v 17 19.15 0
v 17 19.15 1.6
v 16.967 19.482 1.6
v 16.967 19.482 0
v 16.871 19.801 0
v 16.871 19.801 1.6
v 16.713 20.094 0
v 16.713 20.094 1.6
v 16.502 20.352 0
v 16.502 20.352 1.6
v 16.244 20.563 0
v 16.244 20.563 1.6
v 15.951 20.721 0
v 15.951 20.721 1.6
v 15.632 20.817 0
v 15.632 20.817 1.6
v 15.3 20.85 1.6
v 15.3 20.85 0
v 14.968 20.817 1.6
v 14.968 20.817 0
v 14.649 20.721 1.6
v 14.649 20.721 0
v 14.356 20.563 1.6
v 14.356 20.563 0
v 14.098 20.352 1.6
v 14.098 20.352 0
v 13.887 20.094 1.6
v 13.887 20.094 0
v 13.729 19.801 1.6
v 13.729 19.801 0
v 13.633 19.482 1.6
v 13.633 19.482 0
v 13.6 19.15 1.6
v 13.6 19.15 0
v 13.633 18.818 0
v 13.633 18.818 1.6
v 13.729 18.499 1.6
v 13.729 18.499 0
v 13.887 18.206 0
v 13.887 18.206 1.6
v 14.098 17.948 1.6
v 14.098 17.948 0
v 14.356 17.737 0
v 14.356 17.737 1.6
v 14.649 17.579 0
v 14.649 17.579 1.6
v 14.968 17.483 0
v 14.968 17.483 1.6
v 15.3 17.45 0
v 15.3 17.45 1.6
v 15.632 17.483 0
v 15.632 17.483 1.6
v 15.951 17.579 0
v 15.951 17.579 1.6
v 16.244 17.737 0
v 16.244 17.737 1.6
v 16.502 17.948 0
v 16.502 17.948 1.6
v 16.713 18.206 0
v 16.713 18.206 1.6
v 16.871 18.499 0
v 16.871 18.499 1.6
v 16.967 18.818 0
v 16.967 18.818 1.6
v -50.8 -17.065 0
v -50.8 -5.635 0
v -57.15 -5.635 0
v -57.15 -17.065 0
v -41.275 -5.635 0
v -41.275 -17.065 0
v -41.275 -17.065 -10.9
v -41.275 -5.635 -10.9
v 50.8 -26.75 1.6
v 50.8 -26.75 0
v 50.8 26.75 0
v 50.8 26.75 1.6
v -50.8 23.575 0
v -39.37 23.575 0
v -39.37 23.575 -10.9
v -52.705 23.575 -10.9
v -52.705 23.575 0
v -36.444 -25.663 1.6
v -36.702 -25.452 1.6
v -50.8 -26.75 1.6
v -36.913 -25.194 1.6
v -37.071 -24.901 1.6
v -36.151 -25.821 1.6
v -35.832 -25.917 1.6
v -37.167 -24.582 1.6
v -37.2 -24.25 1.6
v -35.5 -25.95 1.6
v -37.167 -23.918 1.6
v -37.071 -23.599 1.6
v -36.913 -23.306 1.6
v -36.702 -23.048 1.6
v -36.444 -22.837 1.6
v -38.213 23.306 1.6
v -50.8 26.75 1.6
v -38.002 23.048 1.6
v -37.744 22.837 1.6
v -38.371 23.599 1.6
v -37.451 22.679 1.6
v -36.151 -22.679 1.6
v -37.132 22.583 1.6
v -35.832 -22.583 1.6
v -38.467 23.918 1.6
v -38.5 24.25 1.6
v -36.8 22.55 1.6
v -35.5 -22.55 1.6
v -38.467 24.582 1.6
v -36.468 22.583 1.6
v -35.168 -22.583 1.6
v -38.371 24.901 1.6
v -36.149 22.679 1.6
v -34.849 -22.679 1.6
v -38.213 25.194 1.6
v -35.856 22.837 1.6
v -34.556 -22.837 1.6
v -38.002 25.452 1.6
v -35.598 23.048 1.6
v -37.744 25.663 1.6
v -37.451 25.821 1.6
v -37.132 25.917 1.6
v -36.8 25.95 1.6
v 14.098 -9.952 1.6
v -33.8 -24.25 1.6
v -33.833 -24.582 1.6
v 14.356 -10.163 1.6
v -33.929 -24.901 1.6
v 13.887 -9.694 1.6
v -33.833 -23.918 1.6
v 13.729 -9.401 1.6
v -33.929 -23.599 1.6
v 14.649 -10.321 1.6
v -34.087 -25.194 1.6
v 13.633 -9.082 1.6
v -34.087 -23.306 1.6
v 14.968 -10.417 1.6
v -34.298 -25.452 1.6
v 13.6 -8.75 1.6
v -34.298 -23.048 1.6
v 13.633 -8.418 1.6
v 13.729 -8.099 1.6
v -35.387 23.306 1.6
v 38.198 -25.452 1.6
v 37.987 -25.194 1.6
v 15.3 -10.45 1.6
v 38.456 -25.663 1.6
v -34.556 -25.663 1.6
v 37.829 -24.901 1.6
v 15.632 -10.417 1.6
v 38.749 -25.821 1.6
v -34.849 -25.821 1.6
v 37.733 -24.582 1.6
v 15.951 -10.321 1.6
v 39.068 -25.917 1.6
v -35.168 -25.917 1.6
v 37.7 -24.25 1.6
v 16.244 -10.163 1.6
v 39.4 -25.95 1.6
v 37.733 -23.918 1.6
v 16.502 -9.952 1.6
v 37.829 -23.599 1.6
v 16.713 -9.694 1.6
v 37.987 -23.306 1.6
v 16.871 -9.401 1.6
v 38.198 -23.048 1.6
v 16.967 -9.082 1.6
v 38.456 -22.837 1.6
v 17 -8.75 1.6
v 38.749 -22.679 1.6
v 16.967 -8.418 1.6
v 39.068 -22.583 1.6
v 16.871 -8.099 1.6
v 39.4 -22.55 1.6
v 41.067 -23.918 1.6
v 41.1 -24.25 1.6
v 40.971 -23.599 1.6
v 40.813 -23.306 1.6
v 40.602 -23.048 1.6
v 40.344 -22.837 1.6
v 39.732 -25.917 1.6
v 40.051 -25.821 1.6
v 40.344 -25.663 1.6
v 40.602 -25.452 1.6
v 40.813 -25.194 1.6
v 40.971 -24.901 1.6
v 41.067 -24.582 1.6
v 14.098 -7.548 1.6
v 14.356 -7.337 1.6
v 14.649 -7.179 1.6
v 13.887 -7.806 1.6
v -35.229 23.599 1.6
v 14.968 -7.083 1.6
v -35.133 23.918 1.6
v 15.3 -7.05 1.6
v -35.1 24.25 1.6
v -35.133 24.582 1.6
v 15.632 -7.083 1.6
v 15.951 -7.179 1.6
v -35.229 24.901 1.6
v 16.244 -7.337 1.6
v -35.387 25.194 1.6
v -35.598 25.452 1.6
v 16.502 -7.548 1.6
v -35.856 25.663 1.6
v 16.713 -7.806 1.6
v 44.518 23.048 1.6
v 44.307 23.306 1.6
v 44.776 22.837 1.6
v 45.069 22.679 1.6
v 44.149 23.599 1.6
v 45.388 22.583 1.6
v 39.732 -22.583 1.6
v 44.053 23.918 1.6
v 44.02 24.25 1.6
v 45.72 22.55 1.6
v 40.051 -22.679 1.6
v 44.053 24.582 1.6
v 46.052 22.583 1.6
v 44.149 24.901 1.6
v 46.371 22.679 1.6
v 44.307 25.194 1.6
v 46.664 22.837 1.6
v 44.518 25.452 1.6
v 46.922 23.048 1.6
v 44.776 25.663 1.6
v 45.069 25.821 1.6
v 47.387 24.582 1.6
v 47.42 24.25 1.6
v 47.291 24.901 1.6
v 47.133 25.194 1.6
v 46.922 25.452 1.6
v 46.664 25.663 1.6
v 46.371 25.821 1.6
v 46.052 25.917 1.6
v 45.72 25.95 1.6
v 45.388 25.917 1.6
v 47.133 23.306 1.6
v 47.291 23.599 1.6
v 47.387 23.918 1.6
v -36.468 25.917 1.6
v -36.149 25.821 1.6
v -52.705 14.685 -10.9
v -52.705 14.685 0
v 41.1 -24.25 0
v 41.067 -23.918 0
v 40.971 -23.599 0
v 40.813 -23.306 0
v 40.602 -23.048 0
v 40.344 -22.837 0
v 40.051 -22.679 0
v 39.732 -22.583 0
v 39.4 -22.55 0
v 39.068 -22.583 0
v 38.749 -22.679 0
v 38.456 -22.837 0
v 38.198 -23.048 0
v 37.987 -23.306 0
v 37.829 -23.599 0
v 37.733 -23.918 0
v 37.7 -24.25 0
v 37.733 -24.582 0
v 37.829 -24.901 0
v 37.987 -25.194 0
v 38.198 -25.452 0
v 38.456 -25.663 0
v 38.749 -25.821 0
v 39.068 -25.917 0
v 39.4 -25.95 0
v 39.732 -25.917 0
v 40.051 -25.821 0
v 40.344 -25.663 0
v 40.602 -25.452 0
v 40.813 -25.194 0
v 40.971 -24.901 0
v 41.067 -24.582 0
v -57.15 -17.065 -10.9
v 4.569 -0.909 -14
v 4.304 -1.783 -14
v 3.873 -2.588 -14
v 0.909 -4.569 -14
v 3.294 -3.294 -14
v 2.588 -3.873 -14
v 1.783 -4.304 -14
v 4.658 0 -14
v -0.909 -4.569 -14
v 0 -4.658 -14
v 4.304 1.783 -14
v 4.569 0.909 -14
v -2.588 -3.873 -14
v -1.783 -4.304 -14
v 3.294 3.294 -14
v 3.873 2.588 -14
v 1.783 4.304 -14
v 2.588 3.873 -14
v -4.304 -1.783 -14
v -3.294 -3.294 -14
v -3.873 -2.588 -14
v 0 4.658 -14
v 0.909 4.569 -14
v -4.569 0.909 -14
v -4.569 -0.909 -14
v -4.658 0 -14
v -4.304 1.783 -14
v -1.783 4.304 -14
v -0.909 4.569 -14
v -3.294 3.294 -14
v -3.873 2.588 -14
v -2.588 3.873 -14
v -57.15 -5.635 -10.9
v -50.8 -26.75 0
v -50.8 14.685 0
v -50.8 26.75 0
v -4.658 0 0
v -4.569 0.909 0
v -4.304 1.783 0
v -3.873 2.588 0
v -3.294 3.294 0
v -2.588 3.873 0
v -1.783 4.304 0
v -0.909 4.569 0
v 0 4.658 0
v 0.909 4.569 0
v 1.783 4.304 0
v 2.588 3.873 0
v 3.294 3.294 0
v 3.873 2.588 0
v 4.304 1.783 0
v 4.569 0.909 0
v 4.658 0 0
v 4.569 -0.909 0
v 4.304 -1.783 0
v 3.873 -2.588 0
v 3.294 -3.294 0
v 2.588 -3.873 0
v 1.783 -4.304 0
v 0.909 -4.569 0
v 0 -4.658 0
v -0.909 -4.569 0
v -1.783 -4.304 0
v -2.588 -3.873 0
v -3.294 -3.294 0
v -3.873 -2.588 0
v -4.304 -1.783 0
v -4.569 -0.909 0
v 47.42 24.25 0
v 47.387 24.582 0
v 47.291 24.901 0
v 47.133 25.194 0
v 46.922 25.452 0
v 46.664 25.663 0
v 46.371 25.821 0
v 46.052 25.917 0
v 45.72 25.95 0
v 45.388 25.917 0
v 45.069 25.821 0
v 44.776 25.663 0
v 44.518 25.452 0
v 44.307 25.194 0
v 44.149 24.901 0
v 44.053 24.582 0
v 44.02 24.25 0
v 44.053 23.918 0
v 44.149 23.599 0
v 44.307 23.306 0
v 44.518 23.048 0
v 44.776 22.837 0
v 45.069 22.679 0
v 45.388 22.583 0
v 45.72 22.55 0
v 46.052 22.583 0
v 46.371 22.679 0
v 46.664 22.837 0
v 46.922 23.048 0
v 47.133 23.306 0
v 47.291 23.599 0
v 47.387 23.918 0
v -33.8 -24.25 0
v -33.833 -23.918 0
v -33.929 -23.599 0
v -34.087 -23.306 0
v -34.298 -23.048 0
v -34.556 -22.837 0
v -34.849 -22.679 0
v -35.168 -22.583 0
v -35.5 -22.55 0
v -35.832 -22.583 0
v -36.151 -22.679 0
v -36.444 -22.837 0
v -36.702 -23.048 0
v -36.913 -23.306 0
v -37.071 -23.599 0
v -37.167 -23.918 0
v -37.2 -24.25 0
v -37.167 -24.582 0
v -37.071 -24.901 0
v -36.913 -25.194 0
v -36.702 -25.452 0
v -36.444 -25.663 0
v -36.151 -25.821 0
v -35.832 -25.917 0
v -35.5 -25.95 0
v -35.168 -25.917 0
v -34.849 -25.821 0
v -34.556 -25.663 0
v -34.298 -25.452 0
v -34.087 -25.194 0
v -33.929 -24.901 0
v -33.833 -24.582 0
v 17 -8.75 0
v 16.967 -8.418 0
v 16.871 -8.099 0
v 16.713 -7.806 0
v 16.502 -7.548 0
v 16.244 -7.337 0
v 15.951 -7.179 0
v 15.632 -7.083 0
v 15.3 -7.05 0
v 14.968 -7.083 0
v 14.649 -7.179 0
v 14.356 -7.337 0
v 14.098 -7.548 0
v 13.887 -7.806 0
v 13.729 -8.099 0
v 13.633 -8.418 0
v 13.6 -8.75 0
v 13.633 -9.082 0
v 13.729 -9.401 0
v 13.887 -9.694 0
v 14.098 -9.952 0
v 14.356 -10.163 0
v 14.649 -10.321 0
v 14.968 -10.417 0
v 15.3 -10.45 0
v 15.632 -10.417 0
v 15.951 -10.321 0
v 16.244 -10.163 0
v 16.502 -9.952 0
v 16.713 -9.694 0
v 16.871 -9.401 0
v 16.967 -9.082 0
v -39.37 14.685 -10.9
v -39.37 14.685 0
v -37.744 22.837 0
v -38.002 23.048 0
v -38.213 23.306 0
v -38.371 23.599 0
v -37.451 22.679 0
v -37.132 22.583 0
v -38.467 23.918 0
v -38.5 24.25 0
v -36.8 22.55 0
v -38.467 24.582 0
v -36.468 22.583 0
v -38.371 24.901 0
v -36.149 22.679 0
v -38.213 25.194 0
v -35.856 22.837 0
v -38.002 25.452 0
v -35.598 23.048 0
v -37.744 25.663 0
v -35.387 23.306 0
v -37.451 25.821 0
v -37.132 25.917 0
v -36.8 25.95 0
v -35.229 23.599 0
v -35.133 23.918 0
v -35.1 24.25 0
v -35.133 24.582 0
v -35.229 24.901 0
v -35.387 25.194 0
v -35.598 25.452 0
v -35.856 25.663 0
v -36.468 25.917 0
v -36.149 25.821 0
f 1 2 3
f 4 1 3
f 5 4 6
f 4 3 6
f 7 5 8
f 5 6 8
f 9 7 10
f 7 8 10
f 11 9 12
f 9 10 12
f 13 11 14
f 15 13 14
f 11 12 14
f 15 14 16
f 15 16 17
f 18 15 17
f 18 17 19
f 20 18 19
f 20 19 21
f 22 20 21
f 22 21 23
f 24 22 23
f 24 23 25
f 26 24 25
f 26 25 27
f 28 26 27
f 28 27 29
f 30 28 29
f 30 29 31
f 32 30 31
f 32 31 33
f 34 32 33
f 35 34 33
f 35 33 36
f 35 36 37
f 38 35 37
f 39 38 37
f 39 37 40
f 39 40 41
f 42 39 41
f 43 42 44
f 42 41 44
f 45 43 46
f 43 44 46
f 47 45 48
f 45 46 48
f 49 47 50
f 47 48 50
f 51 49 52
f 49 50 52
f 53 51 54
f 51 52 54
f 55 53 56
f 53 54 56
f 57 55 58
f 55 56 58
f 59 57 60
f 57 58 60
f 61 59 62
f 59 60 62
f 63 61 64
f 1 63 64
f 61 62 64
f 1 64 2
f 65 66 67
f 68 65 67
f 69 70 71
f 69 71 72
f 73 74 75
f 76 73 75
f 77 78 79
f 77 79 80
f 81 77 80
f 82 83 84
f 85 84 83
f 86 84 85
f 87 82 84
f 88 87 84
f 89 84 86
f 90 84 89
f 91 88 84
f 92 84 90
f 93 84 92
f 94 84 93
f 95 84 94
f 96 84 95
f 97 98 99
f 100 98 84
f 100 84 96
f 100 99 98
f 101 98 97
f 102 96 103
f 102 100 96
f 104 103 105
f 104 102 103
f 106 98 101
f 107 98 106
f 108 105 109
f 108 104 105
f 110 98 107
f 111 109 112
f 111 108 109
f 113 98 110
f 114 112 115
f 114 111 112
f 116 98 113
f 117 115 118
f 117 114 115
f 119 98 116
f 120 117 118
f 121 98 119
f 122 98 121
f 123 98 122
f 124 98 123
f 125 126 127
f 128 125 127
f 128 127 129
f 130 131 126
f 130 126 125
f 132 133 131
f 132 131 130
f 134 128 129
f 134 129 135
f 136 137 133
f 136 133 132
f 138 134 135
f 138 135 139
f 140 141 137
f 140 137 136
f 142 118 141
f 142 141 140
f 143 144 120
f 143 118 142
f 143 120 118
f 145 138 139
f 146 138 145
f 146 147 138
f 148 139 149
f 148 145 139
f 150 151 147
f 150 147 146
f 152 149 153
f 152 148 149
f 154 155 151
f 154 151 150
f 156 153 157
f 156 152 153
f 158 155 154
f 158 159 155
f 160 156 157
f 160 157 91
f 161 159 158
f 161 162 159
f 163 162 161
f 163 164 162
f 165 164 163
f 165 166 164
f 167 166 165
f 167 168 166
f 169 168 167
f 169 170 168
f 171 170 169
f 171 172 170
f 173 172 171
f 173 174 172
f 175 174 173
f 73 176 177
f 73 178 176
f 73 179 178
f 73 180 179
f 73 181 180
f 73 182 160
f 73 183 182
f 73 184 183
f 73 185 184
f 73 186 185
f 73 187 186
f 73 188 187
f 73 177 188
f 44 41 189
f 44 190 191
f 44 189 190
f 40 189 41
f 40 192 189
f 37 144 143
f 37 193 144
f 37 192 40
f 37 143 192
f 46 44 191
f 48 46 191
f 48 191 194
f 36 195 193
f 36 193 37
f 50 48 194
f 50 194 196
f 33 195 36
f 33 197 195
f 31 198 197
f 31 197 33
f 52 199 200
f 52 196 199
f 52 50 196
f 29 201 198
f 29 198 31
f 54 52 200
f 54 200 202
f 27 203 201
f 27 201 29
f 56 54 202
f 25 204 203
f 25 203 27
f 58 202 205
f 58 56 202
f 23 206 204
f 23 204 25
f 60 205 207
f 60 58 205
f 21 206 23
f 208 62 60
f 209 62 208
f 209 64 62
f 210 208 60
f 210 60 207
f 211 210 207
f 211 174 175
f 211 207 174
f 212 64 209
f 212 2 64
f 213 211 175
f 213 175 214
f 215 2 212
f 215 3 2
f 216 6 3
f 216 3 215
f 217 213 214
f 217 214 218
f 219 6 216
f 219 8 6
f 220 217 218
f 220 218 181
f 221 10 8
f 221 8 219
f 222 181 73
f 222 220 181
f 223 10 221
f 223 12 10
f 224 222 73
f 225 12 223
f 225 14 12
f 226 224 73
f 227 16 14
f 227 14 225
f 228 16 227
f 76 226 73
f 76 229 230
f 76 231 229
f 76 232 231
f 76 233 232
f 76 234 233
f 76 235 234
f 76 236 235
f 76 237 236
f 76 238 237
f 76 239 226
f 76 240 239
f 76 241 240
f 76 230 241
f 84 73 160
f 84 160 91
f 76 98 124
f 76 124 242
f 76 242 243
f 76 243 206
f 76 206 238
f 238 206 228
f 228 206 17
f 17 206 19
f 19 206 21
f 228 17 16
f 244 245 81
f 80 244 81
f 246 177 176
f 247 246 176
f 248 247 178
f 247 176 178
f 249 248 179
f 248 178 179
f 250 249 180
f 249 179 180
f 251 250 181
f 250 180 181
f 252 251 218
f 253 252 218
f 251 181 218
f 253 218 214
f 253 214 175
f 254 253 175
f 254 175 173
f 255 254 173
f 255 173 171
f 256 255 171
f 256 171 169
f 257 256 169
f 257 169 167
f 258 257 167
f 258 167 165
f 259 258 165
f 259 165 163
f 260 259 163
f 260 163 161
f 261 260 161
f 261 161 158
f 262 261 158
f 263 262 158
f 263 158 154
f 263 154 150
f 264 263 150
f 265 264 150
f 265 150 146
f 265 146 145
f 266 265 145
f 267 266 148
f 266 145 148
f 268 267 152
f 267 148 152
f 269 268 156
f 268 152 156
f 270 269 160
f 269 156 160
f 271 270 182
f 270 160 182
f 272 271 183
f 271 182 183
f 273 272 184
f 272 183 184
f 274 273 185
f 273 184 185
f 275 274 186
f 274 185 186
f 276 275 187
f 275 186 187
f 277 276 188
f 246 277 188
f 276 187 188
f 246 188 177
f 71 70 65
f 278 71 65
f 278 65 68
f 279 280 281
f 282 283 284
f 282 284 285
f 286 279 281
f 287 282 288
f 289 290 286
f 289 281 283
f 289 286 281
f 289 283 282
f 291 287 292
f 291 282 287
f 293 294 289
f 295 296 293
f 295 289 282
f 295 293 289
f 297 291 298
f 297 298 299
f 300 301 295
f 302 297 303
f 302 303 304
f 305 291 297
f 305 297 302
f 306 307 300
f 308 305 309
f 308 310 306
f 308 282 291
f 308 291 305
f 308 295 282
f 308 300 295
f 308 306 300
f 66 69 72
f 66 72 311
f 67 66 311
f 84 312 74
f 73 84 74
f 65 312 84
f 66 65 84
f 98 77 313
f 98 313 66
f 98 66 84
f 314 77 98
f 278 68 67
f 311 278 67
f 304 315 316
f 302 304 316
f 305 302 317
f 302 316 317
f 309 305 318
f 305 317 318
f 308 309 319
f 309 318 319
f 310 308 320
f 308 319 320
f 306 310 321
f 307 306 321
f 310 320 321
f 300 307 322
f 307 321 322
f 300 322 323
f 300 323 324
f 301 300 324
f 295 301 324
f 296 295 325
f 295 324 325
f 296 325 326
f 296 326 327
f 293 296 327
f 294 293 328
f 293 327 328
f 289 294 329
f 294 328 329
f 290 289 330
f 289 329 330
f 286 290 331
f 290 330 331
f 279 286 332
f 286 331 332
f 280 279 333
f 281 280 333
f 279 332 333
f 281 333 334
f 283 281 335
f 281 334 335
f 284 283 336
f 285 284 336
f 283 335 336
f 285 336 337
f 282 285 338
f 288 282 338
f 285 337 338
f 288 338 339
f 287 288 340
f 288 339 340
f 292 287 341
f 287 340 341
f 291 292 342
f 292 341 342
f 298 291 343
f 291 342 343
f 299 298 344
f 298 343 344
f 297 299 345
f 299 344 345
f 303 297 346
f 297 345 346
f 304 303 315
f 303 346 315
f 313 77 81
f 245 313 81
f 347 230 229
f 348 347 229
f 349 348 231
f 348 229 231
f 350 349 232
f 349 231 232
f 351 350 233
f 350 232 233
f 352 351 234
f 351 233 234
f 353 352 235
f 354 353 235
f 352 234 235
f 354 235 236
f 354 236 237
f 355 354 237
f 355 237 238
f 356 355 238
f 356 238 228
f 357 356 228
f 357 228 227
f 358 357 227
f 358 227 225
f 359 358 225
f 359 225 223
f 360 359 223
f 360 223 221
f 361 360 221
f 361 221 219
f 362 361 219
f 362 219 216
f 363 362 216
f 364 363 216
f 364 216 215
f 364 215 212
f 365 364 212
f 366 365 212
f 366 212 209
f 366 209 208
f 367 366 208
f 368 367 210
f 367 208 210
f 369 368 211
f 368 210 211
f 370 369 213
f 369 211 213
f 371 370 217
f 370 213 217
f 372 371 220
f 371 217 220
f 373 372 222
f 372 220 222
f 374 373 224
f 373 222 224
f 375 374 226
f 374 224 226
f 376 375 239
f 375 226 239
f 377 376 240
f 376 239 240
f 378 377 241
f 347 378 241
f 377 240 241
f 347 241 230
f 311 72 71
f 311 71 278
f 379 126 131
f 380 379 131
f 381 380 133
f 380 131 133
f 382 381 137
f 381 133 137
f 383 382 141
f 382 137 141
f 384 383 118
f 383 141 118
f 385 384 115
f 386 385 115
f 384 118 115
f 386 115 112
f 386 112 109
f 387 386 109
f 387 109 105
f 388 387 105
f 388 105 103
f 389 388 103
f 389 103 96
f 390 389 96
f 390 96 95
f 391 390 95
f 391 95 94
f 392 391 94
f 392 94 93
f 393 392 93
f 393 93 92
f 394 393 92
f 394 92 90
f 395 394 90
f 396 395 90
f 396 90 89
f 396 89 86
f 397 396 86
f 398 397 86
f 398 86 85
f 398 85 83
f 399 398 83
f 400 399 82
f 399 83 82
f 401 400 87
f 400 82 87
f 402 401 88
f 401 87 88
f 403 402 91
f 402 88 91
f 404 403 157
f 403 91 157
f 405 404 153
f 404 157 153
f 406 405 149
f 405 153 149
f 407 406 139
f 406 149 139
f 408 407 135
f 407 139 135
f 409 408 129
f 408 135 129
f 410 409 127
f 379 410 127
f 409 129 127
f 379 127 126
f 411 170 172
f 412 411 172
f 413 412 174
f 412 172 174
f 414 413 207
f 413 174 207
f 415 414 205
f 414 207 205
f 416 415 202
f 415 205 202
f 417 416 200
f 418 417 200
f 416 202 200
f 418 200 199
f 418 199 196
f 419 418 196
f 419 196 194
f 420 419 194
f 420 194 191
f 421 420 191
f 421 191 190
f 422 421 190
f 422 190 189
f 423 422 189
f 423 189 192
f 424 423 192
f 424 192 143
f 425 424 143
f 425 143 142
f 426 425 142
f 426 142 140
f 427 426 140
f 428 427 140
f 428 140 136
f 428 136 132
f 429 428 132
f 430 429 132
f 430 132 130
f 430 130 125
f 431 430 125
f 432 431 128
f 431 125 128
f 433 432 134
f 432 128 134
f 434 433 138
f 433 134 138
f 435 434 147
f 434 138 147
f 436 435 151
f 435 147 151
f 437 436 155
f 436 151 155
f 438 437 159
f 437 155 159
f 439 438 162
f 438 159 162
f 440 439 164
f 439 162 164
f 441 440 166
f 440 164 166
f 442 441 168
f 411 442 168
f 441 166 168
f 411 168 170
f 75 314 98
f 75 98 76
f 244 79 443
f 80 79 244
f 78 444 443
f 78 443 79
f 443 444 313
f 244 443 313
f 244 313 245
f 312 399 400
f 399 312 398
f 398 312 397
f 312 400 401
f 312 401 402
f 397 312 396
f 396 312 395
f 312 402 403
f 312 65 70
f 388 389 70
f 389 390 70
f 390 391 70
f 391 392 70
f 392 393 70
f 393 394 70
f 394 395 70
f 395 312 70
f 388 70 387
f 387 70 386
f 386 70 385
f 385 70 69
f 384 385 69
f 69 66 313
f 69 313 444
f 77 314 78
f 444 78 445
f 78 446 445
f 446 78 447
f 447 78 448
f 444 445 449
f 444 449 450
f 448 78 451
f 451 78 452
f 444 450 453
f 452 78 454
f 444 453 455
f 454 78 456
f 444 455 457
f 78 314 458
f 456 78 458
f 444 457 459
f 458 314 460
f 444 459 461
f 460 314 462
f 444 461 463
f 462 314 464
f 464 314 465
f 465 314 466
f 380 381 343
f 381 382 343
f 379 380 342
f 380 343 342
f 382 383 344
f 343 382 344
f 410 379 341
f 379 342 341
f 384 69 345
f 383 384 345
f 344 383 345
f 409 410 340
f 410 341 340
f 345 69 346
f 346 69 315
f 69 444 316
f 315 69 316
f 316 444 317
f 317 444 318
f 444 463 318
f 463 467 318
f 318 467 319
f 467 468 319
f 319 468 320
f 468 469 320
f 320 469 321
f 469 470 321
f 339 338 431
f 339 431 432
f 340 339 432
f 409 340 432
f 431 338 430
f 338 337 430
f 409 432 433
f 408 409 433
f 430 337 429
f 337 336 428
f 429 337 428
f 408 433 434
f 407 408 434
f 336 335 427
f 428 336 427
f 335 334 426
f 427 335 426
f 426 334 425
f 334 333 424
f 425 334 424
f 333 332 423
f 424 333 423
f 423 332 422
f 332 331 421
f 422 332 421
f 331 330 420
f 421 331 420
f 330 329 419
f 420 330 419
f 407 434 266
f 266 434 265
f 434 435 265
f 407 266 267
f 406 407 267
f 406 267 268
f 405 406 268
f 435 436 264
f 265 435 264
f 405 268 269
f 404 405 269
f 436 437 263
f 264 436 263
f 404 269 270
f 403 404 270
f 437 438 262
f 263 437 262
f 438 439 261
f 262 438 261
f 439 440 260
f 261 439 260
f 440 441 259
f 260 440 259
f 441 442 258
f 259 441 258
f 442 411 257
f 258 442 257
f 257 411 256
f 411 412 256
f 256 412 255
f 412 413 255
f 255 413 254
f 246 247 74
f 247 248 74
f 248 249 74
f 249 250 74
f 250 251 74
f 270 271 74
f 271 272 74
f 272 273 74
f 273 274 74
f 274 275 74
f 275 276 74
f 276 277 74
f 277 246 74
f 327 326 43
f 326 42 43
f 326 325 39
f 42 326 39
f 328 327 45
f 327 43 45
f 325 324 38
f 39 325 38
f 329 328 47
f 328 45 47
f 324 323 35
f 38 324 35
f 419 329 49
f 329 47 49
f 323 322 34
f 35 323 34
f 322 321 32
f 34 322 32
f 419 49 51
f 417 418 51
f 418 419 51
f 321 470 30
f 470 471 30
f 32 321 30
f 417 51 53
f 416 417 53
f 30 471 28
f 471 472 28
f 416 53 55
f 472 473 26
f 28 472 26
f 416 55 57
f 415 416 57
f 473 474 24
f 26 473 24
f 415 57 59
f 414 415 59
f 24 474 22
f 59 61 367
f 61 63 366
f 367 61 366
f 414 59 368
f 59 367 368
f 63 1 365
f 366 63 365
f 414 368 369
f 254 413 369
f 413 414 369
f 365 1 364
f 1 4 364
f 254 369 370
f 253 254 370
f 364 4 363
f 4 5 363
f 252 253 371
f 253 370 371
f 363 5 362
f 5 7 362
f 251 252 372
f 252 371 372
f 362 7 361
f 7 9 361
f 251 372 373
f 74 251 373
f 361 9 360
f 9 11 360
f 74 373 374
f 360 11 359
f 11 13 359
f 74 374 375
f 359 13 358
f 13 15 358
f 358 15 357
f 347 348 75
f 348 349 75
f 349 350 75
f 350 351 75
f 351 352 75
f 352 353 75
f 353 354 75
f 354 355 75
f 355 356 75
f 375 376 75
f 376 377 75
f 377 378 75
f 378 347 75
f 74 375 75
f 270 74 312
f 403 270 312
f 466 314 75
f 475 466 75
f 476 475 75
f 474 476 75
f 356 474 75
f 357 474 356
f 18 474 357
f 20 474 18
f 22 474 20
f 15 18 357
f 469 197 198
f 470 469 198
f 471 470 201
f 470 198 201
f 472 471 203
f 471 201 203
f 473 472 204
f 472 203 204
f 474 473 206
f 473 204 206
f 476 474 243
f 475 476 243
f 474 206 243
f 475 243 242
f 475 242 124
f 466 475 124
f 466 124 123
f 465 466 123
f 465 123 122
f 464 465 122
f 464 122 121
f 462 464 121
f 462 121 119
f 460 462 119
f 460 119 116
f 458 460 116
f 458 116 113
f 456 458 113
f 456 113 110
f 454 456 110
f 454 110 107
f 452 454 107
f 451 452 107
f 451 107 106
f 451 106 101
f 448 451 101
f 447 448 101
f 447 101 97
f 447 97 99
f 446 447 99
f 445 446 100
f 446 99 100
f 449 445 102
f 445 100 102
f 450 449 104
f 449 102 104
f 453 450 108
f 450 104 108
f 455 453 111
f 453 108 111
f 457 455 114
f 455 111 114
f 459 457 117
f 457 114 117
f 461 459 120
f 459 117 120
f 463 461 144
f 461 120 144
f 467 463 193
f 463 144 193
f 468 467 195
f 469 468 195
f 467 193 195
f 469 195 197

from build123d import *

# Parameters (mm, degrees)
SKETCH1_W            = 101.6
SKETCH1_H            = 53.5
BOSS_EXTRUDE1_DEPTH  = 1.6
M3_CLEARANCE_HOLE1_D = 3.4
SKETCH5_W            = 15.875
SKETCH5_H            = 11.43
BOSS_EXTRUDE2_DEPTH  = 10.9
SKETCH6_W            = 13.335
SKETCH6_H            = 8.89
BOSS_EXTRUDE3_DEPTH  = 10.9
SKETCH7_R            = 4.658430909
BOSS_EXTRUDE4_DEPTH  = 14


with BuildPart() as part:
    # Sketch1 → Boss-Extrude1 (new body)
    with BuildSketch(Plane.XY):
        Rectangle(SKETCH1_W, SKETCH1_H)
    extrude(amount=BOSS_EXTRUDE1_DEPTH)

    # M3 Clearance Hole1 (through all)
    with Locations(Plane(origin=(0, 0, 0), x_dir=(-1, 0, 0), z_dir=(0, 0, -1))):
        with Locations((-15.3, 19.15), (-45.72, 24.25), (-15.3, -8.75), (-39.4, -24.25), (35.5, -24.25), (36.8, 24.25)):
            Hole(M3_CLEARANCE_HOLE1_D / 2)

    # Sketch5 → Boss-Extrude2 (add)
    with BuildSketch(Plane(origin=(0, 0, 0), x_dir=(-1, 0, 0), z_dir=(0, 0, -1))):
        with Locations((49.2125, -11.35)):
            Rectangle(SKETCH5_W, SKETCH5_H)
    extrude(amount=BOSS_EXTRUDE2_DEPTH)

    # Sketch6 → Boss-Extrude3 (add)
    with BuildSketch(Plane(origin=(0, 0, 0), x_dir=(-1, 0, 0), z_dir=(0, 0, -1))):
        with Locations((46.0375, 19.13)):
            Rectangle(SKETCH6_W, SKETCH6_H)
    extrude(amount=BOSS_EXTRUDE3_DEPTH)

    # Sketch7 → Boss-Extrude4 (add)
    with BuildSketch(Plane(origin=(0, 0, 0), x_dir=(-1, 0, 0), z_dir=(0, 0, -1))):
        Circle(SKETCH7_R)
    extrude(amount=BOSS_EXTRUDE4_DEPTH)


solid = part.part
